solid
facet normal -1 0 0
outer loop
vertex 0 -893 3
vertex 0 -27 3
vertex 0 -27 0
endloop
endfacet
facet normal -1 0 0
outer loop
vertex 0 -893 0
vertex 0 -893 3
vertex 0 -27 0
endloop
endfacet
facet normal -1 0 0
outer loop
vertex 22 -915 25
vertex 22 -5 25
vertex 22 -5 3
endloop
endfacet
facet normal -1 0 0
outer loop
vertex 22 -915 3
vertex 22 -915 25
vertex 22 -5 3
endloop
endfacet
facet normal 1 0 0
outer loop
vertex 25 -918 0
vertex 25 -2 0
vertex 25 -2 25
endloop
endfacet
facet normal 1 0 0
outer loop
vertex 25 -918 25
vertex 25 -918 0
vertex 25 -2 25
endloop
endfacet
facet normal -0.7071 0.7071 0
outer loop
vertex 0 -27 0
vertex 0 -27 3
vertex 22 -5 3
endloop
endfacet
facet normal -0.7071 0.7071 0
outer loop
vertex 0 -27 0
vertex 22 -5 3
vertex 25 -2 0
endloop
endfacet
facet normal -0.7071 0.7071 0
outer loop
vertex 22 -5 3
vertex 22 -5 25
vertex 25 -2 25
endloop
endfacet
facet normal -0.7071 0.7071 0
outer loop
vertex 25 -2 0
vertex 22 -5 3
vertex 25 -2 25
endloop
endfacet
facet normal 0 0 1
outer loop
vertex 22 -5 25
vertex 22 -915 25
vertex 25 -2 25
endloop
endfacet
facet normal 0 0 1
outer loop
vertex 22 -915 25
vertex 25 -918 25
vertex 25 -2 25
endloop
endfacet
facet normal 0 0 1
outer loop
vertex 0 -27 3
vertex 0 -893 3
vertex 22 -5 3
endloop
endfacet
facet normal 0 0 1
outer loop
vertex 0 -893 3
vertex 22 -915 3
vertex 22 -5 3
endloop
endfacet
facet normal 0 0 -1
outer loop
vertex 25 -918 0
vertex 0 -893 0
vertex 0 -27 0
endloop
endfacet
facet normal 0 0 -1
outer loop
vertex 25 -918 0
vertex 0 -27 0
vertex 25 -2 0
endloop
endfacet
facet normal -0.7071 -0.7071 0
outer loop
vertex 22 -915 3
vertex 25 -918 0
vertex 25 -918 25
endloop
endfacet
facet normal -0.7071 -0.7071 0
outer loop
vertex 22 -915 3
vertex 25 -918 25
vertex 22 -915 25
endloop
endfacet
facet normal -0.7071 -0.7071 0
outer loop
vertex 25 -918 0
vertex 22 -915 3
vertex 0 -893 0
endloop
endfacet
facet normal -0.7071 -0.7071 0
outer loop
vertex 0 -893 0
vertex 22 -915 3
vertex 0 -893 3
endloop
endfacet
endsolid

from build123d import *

# Parameters (mm, degrees)
F1_DEPTH    = 920
F2_T1_DEPTH = 47.7168298797
F4_DEPTH    = 25
F5_T1_DEPTH = 47.7168298797
F7_DEPTH    = 25


# Not quite as in the source:
# - a fillet or chamfer that OpenCascade refuses, or shapes differently, is made with other operations: its cross-section is extruded or revolved along the edge and cut away or added


with BuildPart() as f1:
    # F0 (on Front) → F1 (new body)
    with BuildSketch(Plane.XZ):
        Polygon((0, 3), (0, 0), (25, 0), (25, 25), (22, 25), (22, 3), align=None)
    extrude(amount=F1_DEPTH)

    # F2: chamfer of 5 on 1 edges, made by hand

    # F2_s2 → F2_t1 (cut)
    with BuildSketch(Plane.XY.offset(-9.8584149398)):
        Polygon((22, -5), (27, 0), (22, 0), align=None)
    extrude(amount=F2_T1_DEPTH, mode=Mode.SUBTRACT)

    # F3 (on face) → F4 (cut)
    with BuildSketch(Plane.XY.offset(3)):
        Polygon((0, -27), (22, -5), (22, 0), (0, 0), align=None)
    extrude(amount=-F4_DEPTH, mode=Mode.SUBTRACT)

    # F5: chamfer of 5 on 1 edges, made by hand

    # F5_s2 → F5_t1 (cut)
    with BuildSketch(Plane.XY.offset(-9.8584149398)):
        Polygon((22, -915), (27, -920), (22, -920), align=None)
    extrude(amount=F5_T1_DEPTH, mode=Mode.SUBTRACT)

    # F6 (on face) → F7 (cut)
    with BuildSketch(Plane.XY.offset(3)):
        Polygon((22, -920), (22, -915), (0, -893), (0, -920), align=None)
    extrude(amount=-F7_DEPTH, mode=Mode.SUBTRACT)


solid = f1.part
